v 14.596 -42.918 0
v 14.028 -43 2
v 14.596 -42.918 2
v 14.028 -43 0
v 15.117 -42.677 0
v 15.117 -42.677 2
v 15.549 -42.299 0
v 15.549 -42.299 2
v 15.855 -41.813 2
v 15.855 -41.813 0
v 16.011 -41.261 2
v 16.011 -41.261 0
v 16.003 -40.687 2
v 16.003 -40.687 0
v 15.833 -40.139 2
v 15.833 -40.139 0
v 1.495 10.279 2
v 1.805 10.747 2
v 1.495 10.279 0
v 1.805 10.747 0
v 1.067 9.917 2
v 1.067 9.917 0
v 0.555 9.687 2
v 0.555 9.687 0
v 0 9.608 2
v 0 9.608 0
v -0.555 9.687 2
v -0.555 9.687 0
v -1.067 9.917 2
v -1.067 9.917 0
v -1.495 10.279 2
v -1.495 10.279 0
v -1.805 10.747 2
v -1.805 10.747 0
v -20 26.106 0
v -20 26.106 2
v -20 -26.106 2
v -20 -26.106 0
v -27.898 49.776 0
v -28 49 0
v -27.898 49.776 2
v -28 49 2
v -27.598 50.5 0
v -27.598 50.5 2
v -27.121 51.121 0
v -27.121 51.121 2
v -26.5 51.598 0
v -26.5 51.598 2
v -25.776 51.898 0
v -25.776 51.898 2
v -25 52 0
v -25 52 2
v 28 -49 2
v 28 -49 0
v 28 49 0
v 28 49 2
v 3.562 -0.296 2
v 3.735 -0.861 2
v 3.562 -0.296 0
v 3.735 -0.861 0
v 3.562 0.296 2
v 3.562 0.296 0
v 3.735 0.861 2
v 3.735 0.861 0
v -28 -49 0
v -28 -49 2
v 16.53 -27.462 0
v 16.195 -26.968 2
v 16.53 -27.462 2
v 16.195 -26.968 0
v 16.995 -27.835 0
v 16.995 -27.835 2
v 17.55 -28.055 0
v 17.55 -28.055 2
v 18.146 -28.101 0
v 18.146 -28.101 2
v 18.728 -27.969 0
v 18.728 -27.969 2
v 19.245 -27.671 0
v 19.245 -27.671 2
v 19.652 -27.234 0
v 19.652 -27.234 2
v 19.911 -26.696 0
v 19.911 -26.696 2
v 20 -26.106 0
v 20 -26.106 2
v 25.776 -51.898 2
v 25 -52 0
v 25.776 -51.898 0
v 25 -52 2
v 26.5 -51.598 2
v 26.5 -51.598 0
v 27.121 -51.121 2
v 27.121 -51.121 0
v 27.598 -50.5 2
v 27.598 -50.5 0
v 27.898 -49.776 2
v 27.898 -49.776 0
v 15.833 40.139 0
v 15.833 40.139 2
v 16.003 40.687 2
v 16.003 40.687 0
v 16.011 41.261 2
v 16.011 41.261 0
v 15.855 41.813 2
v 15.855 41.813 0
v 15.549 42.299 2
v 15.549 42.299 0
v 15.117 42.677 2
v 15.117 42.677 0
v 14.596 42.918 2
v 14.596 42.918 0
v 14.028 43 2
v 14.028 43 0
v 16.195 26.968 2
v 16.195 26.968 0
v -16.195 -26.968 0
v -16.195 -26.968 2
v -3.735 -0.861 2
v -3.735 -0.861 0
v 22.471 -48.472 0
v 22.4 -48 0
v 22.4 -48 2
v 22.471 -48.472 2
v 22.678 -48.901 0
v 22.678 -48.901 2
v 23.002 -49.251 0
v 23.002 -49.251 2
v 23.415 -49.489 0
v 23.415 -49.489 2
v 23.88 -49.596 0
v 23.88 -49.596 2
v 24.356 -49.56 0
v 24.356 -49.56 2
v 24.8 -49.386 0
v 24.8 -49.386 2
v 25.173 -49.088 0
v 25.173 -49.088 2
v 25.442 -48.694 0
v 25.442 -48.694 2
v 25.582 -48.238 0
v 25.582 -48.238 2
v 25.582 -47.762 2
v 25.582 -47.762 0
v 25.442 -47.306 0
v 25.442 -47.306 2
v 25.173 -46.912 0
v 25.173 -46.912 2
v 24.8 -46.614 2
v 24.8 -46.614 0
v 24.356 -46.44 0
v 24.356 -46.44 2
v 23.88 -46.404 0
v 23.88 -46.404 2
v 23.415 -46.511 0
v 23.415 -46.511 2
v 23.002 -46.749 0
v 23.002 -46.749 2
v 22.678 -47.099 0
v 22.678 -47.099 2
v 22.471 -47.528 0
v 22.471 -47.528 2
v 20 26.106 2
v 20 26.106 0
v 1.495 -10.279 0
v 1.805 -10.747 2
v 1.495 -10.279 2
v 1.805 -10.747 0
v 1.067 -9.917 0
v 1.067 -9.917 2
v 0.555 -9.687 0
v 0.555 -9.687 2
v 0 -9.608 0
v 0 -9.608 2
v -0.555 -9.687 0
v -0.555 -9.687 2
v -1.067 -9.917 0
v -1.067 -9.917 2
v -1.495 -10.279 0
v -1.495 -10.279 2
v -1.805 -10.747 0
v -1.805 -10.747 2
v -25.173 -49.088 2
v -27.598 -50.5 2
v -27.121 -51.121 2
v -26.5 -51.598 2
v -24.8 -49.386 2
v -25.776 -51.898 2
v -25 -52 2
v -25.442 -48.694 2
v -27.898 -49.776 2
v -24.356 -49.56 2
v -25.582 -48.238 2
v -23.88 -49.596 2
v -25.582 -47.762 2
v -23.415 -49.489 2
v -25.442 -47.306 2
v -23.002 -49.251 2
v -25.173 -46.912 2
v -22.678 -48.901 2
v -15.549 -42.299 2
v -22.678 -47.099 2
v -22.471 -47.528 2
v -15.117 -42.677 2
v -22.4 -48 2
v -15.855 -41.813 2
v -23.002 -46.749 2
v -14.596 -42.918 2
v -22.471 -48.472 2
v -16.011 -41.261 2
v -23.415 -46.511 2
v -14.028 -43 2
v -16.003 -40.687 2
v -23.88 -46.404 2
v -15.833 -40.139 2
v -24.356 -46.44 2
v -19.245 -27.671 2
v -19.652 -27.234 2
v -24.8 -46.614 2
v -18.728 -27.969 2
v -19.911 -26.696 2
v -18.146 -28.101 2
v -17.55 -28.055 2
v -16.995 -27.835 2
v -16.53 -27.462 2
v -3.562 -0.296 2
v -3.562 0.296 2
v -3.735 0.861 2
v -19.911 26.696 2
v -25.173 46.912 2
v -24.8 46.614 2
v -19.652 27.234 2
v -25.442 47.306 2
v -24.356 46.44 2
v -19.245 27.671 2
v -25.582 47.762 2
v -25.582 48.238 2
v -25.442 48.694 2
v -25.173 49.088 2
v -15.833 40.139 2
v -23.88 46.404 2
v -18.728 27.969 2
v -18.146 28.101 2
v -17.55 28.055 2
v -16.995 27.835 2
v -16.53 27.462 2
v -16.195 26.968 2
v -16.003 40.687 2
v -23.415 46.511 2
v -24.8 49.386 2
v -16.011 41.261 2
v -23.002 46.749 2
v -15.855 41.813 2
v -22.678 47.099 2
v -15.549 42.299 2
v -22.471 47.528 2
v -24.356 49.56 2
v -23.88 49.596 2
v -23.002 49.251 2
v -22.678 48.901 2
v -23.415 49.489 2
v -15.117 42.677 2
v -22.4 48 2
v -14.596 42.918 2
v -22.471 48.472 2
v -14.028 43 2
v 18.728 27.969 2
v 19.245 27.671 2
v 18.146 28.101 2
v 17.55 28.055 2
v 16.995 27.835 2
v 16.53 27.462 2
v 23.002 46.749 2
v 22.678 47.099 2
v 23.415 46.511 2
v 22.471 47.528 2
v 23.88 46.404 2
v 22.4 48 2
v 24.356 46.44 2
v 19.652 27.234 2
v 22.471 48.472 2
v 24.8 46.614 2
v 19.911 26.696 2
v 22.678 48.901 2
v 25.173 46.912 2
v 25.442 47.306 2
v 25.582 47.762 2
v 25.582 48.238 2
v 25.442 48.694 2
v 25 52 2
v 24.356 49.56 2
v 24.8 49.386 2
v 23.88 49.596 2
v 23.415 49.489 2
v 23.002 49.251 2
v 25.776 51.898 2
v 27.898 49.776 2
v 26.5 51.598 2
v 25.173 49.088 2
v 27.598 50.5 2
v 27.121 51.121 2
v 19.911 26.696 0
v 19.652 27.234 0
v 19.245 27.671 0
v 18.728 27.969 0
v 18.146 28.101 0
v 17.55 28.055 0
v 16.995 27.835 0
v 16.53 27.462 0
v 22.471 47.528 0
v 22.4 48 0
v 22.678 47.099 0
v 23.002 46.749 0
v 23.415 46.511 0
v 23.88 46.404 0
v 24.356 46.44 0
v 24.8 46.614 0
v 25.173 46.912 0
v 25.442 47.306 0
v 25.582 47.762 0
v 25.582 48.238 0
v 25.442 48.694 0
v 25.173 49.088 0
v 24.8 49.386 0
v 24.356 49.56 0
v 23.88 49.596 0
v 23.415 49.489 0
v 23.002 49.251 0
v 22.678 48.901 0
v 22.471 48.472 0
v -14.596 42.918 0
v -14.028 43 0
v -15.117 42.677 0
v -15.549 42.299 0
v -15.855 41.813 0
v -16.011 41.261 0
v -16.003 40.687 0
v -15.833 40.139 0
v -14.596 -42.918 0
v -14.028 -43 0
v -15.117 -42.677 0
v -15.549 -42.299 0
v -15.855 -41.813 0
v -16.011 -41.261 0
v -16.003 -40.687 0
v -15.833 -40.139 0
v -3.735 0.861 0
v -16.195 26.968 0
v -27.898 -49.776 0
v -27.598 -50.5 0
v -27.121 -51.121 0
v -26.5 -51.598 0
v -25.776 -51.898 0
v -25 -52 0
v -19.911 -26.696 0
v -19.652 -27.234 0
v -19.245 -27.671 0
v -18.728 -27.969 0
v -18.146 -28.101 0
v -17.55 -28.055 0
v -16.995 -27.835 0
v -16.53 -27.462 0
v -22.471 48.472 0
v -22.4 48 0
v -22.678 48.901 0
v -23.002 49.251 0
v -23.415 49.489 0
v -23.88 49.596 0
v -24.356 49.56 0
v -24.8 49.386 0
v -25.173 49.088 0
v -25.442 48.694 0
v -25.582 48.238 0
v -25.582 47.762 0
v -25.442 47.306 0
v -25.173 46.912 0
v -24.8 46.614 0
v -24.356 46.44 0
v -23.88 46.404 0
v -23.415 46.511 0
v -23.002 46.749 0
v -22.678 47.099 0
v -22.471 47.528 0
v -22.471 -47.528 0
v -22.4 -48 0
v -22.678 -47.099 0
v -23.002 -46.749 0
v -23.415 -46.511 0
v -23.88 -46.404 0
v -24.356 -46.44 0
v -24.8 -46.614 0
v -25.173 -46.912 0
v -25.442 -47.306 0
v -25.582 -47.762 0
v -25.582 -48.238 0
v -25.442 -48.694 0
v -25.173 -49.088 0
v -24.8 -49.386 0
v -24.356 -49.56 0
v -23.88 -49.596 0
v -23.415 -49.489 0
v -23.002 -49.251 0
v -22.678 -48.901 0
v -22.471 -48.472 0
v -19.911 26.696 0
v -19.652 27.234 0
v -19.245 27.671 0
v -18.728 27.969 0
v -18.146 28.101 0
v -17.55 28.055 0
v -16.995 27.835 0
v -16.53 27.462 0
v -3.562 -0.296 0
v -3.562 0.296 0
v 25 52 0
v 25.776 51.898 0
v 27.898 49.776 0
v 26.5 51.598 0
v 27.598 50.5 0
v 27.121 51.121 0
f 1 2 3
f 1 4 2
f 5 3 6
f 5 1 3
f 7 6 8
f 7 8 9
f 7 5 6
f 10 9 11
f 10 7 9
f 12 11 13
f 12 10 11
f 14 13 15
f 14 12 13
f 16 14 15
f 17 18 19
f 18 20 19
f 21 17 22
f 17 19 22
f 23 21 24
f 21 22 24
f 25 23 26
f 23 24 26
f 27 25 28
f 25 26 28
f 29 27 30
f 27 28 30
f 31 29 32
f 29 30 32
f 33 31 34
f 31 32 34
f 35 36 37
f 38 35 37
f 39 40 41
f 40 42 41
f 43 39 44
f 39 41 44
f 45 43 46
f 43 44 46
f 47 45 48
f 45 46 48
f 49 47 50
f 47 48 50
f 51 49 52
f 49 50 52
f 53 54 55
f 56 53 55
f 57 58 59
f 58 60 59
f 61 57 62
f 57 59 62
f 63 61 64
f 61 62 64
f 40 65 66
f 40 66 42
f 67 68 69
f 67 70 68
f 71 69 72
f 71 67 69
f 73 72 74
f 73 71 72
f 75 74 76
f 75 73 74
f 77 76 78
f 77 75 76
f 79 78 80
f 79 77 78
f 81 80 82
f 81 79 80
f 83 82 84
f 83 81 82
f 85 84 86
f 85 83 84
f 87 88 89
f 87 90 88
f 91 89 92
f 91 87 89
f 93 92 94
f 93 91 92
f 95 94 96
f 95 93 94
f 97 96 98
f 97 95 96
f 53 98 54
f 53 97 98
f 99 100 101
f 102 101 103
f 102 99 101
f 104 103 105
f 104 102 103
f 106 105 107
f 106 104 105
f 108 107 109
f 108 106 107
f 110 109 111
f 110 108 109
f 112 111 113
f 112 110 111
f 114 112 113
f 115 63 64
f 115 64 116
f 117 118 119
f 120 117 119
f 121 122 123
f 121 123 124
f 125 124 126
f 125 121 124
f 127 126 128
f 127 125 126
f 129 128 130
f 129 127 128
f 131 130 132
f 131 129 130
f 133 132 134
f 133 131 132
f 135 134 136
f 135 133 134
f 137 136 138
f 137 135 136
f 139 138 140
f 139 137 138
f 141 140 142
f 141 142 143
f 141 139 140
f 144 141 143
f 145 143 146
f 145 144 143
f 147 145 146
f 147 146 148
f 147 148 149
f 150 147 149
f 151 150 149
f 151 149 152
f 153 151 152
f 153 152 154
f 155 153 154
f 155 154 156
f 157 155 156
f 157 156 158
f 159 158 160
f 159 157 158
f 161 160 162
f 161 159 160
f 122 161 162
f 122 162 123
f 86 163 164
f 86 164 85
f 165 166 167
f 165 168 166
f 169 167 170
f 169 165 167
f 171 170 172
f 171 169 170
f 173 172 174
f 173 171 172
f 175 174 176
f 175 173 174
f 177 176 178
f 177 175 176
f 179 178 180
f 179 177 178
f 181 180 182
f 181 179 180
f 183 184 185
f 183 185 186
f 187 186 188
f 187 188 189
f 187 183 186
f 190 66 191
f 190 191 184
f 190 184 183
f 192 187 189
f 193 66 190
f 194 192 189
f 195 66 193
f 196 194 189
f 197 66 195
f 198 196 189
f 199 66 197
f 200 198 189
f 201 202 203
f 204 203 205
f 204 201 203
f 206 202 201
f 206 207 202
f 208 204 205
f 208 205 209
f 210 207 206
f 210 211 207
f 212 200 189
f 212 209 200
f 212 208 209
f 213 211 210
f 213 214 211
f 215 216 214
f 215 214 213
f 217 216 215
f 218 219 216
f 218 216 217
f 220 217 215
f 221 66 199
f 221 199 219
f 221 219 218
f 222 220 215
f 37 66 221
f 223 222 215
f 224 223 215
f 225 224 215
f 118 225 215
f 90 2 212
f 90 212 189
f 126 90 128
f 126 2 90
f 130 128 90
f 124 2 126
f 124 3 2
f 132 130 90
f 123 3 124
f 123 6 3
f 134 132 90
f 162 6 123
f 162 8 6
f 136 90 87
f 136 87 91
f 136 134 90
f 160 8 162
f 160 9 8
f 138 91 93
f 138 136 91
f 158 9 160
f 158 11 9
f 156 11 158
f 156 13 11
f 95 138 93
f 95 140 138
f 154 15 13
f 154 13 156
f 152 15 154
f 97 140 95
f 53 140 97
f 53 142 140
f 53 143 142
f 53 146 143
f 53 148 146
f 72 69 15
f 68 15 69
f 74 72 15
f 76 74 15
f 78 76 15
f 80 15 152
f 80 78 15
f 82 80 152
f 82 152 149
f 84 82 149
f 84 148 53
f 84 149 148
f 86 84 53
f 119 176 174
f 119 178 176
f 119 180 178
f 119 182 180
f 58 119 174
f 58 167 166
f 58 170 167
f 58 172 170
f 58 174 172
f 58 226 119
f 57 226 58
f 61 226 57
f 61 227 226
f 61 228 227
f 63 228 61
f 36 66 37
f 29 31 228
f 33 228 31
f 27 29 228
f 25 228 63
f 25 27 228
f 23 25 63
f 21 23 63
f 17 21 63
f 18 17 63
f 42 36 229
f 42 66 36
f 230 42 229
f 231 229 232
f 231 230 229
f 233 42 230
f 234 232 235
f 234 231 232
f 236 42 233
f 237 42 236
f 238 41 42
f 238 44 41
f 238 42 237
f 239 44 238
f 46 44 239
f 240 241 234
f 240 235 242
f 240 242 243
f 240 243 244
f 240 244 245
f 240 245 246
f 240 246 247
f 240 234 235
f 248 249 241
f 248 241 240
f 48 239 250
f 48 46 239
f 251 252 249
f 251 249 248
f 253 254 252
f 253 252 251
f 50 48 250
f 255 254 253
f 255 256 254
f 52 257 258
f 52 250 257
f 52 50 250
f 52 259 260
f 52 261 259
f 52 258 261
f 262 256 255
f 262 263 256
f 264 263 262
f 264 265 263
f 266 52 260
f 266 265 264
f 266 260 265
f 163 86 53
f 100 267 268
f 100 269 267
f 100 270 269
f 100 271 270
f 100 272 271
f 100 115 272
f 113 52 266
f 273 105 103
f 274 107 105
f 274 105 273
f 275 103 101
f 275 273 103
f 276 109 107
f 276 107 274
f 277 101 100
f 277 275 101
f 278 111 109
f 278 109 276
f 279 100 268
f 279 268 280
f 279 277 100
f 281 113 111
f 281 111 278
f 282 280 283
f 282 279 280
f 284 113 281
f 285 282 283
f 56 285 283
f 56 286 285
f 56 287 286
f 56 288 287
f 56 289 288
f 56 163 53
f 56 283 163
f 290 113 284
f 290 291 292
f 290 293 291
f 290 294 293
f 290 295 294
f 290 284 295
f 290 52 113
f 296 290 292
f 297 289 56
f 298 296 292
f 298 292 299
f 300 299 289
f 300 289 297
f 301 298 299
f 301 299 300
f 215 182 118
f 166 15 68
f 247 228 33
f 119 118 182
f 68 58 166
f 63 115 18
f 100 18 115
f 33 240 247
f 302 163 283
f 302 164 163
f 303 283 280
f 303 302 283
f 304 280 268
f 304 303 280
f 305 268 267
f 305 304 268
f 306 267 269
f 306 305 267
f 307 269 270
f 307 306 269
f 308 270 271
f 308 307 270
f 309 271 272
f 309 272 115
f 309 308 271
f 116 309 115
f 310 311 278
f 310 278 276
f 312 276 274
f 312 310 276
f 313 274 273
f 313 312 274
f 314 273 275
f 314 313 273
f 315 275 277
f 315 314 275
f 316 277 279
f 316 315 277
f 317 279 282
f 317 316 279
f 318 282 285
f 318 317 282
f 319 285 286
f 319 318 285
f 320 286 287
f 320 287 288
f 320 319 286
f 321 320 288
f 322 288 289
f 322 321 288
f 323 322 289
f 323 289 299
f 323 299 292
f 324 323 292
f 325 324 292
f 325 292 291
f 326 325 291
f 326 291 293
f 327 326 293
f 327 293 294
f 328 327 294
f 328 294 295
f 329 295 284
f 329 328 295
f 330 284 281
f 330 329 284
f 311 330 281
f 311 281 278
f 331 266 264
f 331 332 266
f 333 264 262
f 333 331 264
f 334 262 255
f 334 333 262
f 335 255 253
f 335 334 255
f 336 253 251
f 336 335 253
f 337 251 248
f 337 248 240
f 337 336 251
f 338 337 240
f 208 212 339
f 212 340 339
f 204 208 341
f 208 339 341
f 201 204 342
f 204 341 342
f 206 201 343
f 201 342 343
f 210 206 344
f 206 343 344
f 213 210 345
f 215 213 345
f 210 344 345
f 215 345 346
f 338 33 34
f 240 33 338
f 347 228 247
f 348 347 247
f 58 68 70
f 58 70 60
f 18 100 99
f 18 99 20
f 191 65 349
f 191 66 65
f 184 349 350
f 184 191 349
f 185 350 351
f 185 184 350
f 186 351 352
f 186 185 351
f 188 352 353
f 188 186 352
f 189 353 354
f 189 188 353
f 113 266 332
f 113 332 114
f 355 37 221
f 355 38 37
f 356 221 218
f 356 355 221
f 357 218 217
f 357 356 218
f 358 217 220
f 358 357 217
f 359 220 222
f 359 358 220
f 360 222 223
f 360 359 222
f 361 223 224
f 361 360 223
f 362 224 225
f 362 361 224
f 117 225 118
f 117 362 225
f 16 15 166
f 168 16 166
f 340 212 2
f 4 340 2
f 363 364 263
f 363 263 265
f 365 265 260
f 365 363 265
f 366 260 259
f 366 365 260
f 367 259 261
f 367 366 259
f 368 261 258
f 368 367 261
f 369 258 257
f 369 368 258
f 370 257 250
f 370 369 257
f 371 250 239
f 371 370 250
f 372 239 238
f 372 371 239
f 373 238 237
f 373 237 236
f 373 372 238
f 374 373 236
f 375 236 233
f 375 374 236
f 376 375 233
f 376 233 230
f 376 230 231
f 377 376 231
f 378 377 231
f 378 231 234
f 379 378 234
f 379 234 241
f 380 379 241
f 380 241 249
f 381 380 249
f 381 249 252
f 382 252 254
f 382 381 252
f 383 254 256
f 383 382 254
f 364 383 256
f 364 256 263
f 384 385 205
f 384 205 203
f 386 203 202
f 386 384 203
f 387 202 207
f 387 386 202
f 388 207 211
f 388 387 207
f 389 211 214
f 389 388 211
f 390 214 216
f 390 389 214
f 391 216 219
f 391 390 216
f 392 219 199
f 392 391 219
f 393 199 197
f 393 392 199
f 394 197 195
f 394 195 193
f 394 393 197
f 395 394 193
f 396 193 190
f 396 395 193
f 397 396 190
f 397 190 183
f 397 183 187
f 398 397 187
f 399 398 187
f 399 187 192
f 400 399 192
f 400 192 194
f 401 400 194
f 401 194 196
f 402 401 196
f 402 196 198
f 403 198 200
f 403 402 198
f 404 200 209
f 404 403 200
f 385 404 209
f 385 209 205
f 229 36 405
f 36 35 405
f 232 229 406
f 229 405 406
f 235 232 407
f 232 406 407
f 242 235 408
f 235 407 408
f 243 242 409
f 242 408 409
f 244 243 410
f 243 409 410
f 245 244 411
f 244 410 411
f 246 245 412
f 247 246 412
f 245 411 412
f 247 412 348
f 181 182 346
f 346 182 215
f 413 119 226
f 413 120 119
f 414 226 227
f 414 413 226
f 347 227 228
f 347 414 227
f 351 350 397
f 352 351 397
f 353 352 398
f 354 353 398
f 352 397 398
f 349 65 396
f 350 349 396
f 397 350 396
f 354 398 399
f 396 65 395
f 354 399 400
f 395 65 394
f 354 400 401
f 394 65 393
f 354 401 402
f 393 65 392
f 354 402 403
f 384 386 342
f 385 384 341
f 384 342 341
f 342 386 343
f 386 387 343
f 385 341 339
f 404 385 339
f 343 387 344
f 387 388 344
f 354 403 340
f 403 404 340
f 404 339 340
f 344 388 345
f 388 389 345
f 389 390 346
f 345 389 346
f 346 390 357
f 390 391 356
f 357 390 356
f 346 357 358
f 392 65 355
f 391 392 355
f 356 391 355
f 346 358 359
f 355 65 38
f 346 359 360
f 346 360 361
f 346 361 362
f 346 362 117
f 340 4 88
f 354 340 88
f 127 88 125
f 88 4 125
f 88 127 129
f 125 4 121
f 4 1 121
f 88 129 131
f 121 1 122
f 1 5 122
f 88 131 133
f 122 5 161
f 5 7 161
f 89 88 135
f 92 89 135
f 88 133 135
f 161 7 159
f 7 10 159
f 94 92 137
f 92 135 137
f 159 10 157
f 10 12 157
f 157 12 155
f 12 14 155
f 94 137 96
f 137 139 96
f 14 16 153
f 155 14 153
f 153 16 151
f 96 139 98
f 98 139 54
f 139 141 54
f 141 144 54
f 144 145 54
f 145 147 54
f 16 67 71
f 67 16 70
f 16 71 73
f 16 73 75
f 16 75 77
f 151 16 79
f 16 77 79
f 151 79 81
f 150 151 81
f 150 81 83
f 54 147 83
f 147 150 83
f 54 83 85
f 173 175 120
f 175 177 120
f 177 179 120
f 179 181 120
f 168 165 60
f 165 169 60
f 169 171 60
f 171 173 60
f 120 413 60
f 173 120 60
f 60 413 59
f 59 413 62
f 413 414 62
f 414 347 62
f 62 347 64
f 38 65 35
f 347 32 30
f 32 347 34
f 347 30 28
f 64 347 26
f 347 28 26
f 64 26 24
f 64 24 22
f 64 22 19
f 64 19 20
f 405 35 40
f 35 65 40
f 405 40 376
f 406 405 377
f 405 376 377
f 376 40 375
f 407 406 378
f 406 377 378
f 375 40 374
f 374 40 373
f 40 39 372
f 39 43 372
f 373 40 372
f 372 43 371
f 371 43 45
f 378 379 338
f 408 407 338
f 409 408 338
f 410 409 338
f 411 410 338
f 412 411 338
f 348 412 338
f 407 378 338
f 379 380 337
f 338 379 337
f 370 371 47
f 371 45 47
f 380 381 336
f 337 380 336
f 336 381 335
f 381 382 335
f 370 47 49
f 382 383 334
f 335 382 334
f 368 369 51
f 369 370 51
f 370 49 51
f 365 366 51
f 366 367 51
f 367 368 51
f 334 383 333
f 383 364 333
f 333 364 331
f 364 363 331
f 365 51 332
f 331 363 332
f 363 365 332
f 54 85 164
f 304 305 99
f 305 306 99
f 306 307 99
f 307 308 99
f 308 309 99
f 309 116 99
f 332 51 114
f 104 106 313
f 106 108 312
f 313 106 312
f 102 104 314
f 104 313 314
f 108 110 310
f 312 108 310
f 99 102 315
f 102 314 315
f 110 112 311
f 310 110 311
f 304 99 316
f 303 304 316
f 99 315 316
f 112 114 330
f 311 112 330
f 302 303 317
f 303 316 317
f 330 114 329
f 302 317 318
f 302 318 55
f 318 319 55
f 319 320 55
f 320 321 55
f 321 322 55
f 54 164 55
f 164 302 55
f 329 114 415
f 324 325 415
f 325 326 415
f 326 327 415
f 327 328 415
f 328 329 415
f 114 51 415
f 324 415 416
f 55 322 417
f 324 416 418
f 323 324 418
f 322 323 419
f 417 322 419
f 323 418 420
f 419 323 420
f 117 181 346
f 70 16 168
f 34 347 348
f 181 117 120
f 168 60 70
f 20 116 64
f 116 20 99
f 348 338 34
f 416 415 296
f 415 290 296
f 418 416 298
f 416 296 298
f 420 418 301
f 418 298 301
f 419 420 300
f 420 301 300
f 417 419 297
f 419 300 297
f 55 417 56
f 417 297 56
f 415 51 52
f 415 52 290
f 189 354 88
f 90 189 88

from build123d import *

# Parameters (mm, degrees)
SKETCH_1_W          = 56
SKETCH_1_H          = 104
SKETCH_1_R          = 1.6
EXTRUDE_1_DEPTH     = 2
FILLET_1_R          = 3
CUT_EXTRUDE_1_DEPTH = 10
FILLET_2_R          = 2


with BuildPart() as part:
    # 草图1 → 凸台-拉伸1 (new body)
    with BuildSketch(Plane.XY):
        Rectangle(SKETCH_1_W, SKETCH_1_H)
        with Locations((-24, 48)):
            Circle(SKETCH_1_R, mode=Mode.SUBTRACT)
        with Locations((-24, -48)):
            Circle(SKETCH_1_R, mode=Mode.SUBTRACT)
        with Locations(Location((24, -48, 0), (0, 0, 180))):
            Circle(SKETCH_1_R, mode=Mode.SUBTRACT)
        with Locations(Location((24, 48, 0), (0, 0, 180))):
            Circle(SKETCH_1_R, mode=Mode.SUBTRACT)
    extrude(amount=EXTRUDE_1_DEPTH)

    # 圆角1
    fillet_1_edges = [part.edges().sort_by_distance(p)[0] for p in [
        (28, -52, 1),
        (-28, -52, 1),
        (-28, 52, 1),
        (28, 52, 1),
    ]]
    fillet(fillet_1_edges, radius=FILLET_1_R)

    # 草图2 → 切除-拉伸1 (cut)
    with BuildSketch(Plane.XY.offset(2)):
        Polygon((-20, 34.939835194), (-20, -34.939835194), (-3.324169566, 0), align=None)
        Polygon((-17.198557706, -43), (17.198557706, -43), (0, -6.96492671), align=None)
        Polygon((0, 6.96492671), (-17.198557706, 43), (17.198557706, 43), align=None)
        Polygon((3.324169566, 0), (20, 34.939835194), (20, -34.939835194), align=None)
    extrude(amount=-CUT_EXTRUDE_1_DEPTH, mode=Mode.SUBTRACT)

    # 圆角2
    fillet_2_edges = [part.edges().sort_by_distance(p)[0] for p in [
        (-3.324169566, 0, 1),
        (-20, -34.939835194, 1),
        (-20, 34.939835194, 1),
        (-17.198557706, -43, 1),
        (0, -6.96492671, 1),
        (17.198557706, -43, 1),
        (17.198557706, 43, 1),
        (0, 6.96492671, 1),
        (-17.198557706, 43, 1),
        (20, -34.939835194, 1),
        (3.324169566, 0, 1),
        (20, 34.939835194, 1),
    ]]
    fillet(fillet_2_edges, radius=FILLET_2_R)


solid = part.part
